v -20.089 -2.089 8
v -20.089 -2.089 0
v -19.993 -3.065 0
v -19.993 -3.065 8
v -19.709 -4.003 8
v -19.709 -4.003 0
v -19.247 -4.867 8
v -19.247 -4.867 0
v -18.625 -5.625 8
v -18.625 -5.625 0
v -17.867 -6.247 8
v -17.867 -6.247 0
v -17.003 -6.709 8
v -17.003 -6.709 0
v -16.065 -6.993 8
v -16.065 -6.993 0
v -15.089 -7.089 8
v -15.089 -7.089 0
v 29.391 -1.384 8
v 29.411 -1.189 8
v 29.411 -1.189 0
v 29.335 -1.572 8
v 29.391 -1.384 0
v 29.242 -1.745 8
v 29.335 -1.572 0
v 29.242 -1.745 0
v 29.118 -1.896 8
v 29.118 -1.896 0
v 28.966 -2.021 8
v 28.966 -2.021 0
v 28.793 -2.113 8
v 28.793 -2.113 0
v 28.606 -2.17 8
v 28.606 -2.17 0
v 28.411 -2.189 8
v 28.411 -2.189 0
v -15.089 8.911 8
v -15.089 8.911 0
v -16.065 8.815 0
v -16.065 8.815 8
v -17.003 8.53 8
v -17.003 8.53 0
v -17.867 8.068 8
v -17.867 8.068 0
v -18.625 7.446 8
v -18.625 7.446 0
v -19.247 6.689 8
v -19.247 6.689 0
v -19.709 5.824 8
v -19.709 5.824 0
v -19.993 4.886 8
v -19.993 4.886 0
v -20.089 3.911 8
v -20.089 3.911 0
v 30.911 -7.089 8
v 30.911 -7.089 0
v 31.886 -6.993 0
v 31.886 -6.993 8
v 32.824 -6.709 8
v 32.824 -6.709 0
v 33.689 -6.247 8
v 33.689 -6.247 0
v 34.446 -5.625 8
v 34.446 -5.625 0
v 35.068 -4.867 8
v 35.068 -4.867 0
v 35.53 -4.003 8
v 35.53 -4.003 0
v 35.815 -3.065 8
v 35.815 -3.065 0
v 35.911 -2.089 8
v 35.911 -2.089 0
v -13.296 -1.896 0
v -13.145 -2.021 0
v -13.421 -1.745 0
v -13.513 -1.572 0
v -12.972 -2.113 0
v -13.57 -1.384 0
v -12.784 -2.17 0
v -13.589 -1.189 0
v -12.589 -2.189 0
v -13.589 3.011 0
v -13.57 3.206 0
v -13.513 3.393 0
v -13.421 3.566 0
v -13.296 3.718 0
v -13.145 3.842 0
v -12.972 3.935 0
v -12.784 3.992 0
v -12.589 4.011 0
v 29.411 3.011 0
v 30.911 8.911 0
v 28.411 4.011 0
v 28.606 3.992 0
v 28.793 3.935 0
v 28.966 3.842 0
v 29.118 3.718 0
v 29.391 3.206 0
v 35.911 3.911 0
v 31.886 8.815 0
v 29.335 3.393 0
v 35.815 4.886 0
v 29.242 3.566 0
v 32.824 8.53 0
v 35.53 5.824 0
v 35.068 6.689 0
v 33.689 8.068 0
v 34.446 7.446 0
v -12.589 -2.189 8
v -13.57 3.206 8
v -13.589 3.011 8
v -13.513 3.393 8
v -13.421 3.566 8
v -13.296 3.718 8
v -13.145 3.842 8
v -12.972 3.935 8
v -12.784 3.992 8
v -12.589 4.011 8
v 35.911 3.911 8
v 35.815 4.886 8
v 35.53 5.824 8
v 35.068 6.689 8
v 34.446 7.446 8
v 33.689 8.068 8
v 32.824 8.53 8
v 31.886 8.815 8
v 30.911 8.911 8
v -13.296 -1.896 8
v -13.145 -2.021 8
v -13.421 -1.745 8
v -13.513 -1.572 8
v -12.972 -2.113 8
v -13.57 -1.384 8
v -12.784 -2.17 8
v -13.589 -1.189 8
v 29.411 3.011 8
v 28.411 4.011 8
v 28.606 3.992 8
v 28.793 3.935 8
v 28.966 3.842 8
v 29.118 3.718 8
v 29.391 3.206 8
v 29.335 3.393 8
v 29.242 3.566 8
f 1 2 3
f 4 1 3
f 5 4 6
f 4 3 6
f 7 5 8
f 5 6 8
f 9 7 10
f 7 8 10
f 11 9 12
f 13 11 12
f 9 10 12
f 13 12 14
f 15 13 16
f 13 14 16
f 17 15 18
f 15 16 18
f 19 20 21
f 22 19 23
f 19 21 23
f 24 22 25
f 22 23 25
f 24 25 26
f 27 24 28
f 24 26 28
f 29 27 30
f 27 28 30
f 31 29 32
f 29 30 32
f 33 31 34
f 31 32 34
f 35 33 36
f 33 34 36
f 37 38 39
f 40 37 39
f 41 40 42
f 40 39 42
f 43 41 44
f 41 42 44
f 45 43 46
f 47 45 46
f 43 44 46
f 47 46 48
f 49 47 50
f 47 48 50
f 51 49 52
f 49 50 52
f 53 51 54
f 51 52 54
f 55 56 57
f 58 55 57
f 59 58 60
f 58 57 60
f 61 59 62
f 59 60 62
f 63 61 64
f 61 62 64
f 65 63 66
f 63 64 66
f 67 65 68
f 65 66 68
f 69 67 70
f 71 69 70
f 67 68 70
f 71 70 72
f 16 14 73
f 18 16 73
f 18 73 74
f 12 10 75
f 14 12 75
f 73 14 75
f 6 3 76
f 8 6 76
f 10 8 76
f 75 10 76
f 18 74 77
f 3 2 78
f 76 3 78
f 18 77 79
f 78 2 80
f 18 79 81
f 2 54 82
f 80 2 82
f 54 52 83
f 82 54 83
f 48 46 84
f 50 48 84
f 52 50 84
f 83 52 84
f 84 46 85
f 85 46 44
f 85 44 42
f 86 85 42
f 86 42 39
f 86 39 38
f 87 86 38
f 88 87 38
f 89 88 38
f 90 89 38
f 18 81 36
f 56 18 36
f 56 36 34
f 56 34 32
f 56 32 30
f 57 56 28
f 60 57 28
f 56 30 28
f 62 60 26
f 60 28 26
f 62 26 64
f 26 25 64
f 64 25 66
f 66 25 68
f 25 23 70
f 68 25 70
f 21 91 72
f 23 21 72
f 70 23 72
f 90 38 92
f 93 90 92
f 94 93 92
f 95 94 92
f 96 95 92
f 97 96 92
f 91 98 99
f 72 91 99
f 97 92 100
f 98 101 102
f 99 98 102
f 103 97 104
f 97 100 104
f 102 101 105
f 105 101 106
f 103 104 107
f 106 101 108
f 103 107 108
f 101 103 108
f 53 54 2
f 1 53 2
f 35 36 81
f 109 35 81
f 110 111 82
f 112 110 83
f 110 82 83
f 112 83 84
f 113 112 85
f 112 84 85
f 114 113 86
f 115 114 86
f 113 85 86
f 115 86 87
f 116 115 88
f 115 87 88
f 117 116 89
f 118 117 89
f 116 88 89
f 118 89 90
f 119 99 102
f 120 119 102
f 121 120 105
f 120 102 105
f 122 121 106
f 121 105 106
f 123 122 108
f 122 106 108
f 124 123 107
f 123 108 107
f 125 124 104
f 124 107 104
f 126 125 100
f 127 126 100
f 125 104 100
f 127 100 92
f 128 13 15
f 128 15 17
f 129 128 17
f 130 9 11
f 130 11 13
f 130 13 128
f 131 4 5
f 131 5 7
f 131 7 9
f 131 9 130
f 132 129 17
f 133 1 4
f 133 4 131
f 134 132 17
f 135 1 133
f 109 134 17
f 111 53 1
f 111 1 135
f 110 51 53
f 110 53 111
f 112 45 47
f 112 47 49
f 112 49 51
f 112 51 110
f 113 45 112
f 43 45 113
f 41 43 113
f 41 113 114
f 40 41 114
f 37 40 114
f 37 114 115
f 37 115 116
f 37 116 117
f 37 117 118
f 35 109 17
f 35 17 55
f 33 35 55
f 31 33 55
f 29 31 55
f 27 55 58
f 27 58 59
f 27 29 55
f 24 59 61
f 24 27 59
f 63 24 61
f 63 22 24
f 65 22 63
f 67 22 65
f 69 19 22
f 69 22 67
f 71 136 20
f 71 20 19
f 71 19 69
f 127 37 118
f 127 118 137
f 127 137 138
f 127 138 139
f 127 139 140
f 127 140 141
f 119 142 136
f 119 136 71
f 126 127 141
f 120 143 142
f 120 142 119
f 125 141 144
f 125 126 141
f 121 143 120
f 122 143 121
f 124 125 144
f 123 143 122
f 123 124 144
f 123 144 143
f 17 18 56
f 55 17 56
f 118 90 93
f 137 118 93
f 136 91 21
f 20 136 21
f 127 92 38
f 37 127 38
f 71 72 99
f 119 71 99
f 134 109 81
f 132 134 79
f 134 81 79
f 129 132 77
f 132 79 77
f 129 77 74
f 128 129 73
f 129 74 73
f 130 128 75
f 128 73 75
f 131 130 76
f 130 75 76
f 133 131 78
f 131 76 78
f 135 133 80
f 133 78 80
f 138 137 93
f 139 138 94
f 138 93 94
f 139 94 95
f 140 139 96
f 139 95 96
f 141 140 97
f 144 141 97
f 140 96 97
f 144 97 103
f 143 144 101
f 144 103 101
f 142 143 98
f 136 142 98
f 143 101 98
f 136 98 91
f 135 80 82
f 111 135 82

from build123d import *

# Parameters (mm, degrees)
F1_DEPTH = 8


with BuildPart() as f1:
    # F0 (on Top) → F1 (new body)
    with BuildSketch(Plane.XY):
        with BuildLine():
            Line((30.910678, 8.910768), (-15.089322, 8.910768))
            ThreePointArc((-15.089322, 8.910768), (-18.624856, 7.446301), (-20.089322, 3.910768))
            Line((-20.089322, 3.910768), (-20.089322, 0.910768))
            Line((-20.089322, 0.910768), (-20.089322, -2.089232))
            ThreePointArc((-20.089322, -2.089232), (-18.624856, -5.624766), (-15.089322, -7.089232))
            Line((-15.089322, -7.089232), (30.910678, -7.089232))
            ThreePointArc((30.910678, -7.089232), (34.446212, -5.624766), (35.910678, -2.089232))
            Line((35.910678, -2.089232), (35.910678, 0.910768))
            Line((35.910678, 0.910768), (35.910678, 3.910768))
            ThreePointArc((35.910678, 3.910768), (34.446212, 7.446301), (30.910678, 8.910768))
        make_face()
        with BuildLine():
            Line((-13.589322, -1.189232), (-13.589322, 0.910768))
            Line((-13.589322, 0.910768), (-13.589322, 3.010768))
            ThreePointArc((-13.589322, 3.010768), (-13.296429, 3.717874), (-12.589322, 4.010768))
            Line((-12.589322, 4.010768), (28.410678, 4.010768))
            ThreePointArc((28.410678, 4.010768), (29.117785, 3.717874), (29.410678, 3.010768))
            Line((29.410678, 3.010768), (29.410678, 0.910768))
            Line((29.410678, 0.910768), (29.410678, -1.189232))
            ThreePointArc((29.410678, -1.189232), (29.117785, -1.896339), (28.410678, -2.189232))
            Line((28.410678, -2.189232), (-12.589322, -2.189232))
            ThreePointArc((-12.589322, -2.189232), (-13.296429, -1.896339), (-13.589322, -1.189232))
        make_face(mode=Mode.SUBTRACT)
    extrude(amount=F1_DEPTH)


solid = f1.part
